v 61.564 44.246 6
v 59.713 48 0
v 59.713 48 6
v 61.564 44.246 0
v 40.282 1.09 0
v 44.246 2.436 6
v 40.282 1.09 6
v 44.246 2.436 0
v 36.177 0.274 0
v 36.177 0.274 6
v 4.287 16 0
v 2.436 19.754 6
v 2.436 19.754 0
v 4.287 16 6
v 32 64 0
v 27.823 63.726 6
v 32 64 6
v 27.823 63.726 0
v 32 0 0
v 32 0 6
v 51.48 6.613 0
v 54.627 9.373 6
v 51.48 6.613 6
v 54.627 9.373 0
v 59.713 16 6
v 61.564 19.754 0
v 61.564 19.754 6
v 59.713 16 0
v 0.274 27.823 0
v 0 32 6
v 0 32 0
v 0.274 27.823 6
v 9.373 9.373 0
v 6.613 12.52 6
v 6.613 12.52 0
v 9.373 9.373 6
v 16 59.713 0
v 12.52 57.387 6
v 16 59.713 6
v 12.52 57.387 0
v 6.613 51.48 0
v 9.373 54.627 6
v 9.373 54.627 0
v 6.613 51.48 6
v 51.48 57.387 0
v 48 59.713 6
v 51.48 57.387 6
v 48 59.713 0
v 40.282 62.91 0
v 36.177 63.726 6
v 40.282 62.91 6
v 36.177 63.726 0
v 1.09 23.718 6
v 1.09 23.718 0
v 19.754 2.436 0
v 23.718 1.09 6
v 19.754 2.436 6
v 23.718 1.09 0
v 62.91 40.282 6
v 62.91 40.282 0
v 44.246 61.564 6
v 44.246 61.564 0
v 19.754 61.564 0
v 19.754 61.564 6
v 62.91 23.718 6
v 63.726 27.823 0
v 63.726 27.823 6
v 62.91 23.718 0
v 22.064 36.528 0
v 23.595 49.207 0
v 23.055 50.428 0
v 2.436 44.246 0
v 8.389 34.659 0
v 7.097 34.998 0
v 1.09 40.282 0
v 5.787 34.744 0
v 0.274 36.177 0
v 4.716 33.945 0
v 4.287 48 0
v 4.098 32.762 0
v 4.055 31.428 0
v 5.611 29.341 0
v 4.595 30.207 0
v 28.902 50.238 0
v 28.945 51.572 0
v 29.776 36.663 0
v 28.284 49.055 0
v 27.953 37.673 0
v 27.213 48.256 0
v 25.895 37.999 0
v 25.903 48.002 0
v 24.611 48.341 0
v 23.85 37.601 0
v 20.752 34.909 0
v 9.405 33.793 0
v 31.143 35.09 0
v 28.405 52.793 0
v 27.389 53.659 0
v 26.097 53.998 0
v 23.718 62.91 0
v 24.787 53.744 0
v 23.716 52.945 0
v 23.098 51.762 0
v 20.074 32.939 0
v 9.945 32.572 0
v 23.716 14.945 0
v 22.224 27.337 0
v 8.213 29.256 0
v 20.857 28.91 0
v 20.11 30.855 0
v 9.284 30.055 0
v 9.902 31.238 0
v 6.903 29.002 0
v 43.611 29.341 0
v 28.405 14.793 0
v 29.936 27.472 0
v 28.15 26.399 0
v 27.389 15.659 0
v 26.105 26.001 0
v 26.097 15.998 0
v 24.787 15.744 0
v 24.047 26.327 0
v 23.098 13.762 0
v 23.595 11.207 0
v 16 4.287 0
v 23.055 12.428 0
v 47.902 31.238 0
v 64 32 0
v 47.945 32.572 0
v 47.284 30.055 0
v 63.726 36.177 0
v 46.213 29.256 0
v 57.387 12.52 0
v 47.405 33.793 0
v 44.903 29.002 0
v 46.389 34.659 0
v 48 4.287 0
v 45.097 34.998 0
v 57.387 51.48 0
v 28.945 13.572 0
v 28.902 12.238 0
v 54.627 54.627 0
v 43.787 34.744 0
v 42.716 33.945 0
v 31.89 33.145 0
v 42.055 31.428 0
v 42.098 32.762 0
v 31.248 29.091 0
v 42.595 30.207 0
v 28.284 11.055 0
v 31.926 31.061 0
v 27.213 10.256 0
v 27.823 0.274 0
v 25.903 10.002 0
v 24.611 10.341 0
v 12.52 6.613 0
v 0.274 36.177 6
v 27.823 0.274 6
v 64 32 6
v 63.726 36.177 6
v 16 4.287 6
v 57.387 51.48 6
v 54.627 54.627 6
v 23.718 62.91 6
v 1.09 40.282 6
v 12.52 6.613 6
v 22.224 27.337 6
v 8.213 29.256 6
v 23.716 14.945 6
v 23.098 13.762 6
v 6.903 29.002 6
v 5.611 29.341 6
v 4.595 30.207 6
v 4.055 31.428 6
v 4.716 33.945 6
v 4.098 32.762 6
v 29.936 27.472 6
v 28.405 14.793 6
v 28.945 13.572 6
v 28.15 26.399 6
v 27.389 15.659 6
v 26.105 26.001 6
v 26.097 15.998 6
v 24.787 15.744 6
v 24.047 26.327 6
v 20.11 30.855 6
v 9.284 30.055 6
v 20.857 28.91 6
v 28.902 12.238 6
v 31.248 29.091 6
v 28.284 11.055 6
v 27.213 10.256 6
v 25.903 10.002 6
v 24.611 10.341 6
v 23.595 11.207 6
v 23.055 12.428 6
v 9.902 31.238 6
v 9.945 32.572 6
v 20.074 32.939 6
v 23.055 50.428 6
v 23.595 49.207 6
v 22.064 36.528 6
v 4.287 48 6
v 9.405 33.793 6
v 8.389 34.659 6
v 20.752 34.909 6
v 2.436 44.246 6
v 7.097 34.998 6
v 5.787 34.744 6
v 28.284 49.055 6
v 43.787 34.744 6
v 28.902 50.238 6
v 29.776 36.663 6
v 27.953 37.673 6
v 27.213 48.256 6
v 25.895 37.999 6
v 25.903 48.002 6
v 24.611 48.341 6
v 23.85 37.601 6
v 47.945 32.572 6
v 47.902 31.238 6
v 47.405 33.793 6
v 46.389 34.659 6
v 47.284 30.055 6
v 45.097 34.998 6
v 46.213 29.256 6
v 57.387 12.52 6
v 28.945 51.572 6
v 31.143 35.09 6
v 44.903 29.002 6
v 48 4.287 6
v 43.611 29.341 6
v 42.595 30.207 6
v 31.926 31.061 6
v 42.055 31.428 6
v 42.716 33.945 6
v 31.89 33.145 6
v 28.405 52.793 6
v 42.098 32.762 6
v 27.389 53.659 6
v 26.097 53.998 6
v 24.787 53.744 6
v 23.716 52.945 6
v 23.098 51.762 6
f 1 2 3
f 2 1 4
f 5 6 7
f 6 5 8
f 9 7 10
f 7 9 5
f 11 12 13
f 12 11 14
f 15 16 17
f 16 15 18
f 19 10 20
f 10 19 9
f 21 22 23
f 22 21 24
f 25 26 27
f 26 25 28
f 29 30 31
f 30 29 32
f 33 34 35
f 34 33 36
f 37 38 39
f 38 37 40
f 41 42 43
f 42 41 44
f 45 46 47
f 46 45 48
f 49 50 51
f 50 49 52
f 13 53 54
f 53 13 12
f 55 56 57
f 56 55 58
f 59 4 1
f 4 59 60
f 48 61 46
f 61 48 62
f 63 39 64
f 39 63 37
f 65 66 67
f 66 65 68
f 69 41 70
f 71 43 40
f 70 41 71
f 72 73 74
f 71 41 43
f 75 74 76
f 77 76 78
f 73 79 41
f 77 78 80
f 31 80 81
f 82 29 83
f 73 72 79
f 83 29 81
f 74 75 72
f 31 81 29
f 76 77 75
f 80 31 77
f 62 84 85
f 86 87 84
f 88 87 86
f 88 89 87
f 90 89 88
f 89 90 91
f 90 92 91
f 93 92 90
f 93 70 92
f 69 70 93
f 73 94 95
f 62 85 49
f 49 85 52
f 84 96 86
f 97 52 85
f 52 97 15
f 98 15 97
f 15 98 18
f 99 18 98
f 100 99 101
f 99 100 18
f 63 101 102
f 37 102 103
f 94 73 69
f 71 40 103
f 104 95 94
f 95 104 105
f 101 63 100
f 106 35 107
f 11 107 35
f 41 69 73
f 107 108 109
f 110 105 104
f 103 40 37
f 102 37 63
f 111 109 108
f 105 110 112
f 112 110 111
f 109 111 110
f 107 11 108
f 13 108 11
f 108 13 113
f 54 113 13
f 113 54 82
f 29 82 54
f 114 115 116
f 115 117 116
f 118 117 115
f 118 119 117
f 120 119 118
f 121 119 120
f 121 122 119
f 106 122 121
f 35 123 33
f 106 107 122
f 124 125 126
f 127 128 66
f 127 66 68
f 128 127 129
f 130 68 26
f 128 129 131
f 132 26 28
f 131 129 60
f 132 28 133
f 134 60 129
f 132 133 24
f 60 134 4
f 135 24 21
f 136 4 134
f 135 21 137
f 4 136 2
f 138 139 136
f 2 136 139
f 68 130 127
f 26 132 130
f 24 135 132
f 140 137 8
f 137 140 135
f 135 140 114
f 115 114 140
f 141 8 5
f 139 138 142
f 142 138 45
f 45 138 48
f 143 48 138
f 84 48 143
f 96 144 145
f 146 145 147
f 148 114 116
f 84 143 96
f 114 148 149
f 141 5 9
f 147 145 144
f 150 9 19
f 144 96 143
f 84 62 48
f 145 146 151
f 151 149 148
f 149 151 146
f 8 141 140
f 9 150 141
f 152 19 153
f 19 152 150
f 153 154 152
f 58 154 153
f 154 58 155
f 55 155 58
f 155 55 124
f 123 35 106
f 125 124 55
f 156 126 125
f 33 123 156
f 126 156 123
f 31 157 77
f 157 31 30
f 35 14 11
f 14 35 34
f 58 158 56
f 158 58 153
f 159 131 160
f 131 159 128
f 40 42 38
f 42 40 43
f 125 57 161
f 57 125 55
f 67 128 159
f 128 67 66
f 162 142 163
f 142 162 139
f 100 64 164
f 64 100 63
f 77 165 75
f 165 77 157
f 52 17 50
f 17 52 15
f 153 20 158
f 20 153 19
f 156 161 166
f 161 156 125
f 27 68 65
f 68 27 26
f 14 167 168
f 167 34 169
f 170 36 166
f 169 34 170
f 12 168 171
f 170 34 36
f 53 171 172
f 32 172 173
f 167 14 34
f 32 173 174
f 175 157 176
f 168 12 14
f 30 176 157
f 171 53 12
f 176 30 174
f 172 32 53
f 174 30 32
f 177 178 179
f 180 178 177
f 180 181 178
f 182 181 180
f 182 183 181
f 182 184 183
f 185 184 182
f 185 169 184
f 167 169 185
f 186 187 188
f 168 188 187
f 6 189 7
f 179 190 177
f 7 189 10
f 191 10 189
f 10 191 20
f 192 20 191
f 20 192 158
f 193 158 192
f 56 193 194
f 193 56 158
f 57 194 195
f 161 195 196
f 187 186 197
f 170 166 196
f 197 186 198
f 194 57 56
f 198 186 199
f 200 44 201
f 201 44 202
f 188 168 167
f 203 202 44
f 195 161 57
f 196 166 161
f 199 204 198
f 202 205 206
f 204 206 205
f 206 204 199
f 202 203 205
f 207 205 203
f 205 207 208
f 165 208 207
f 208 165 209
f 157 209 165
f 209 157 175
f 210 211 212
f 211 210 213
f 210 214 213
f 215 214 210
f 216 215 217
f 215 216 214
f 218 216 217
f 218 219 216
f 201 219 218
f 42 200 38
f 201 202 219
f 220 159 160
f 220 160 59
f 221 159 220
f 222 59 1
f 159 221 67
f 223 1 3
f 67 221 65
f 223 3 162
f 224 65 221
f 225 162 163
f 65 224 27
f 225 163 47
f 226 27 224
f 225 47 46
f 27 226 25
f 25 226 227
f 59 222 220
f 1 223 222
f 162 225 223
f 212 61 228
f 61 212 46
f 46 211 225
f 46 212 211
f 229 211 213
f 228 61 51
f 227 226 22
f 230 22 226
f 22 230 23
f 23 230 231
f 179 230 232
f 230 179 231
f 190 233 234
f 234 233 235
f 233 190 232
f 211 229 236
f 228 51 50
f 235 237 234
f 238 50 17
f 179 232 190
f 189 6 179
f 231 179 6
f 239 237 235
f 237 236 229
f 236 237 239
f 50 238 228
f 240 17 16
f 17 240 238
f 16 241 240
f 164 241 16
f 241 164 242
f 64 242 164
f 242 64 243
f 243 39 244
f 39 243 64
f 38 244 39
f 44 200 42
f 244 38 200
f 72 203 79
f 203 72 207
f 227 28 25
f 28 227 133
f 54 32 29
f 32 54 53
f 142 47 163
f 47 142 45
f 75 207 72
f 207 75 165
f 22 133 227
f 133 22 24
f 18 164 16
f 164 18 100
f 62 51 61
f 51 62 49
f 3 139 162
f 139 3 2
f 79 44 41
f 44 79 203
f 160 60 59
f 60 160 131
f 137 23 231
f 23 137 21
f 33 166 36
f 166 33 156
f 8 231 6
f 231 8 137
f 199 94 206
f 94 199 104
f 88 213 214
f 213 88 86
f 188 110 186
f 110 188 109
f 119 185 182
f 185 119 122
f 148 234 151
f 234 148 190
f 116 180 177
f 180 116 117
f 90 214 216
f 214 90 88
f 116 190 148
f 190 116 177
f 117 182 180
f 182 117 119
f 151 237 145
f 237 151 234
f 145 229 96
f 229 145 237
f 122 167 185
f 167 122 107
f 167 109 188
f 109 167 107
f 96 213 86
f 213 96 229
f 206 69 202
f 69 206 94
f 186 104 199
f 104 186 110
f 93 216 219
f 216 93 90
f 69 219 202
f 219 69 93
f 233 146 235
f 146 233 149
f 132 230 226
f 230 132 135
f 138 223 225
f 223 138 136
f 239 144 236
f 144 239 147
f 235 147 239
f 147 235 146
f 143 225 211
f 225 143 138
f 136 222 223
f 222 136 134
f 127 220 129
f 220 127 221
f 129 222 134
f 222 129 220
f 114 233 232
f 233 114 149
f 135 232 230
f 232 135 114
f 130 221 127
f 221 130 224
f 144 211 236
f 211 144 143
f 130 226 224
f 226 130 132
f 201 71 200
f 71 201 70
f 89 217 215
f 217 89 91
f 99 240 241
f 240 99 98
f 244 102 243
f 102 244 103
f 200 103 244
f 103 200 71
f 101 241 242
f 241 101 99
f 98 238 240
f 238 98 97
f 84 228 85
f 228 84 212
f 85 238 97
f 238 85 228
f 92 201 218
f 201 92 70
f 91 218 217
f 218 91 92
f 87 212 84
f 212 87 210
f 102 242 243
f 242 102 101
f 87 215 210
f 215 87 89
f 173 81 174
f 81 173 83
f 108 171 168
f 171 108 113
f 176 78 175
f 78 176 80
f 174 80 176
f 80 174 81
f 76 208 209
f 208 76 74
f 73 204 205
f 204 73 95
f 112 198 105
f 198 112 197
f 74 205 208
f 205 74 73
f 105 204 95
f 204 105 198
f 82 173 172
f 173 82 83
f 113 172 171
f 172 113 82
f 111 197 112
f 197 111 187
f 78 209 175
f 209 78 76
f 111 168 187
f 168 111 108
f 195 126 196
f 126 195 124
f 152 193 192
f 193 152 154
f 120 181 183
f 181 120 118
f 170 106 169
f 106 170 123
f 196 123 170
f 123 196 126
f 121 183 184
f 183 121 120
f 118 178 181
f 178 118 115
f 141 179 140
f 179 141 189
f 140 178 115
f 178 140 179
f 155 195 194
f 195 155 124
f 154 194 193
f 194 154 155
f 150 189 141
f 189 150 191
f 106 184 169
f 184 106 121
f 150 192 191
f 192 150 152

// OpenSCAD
$fn = 32;

// ----------------------------------------------------------------------
// Cam plate: eccentric cam, base R32
// ----------------------------------------------------------------------

// --- parameters (mm) ---
base_r = 32;              // base circle radius
lobe_h = 12;              // cam lobe rise
bore_r = 6;               // shaft bore radius
plate_t = 6;              // plate thickness, Z (extrusion height)
ecc = 6;                  // disc eccentricity
ring_r = 19;              // lightening ring radius
bolt_r = 3;               // lightening hole radius
fit_tol = 0.1;            // declared fit tolerance (prompt contract)
free_tol = 0.3;           // declared free tolerance (prompt contract)

profile = [[64, 32], [63.726, 36.177], [62.91, 40.282], [61.564, 44.246], [59.713, 48], [57.387, 51.48], [54.627, 54.627], [51.48, 57.387], [48, 59.713], [44.246, 61.564], [40.282, 62.91], [36.177, 63.726], [32, 64], [27.823, 63.726], [23.718, 62.91], [19.754, 61.564], [16, 59.713], [12.52, 57.387], [9.373, 54.627], [6.613, 51.48], [4.287, 48], [2.436, 44.246], [1.09, 40.282], [0.274, 36.177], [0, 32], [0.274, 27.823], [1.09, 23.718], [2.436, 19.754], [4.287, 16], [6.613, 12.52], [9.373, 9.373], [12.52, 6.613], [16, 4.287], [19.754, 2.436], [23.718, 1.09], [27.823, 0.274], [32, 0], [36.177, 0.274], [40.282, 1.09], [44.246, 2.436], [48, 4.287], [51.48, 6.613], [54.627, 9.373], [57.387, 12.52], [59.713, 16], [61.564, 19.754], [62.91, 23.718], [63.726, 27.823]];  // primary outline, 48 points, counter clockwise
void_1 = [[31.89, 33.145], [31.143, 35.09], [29.776, 36.663], [27.953, 37.673], [25.895, 37.999], [23.85, 37.601], [22.064, 36.528], [20.752, 34.909], [20.074, 32.939], [20.11, 30.855], [20.857, 28.91], [22.224, 27.337], [24.047, 26.327], [26.105, 26.001], [28.15, 26.399], [29.936, 27.472], [31.248, 29.091], [31.926, 31.061]];  // shaft bore, 18 points
void_2 = [[47.945, 32.572], [47.405, 33.793], [46.389, 34.659], [45.097, 34.998], [43.787, 34.744], [42.716, 33.945], [42.098, 32.762], [42.055, 31.428], [42.595, 30.207], [43.611, 29.341], [44.903, 29.002], [46.213, 29.256], [47.284, 30.055], [47.902, 31.238]];  // lightening hole 1, 14 points
void_3 = [[28.945, 51.572], [28.405, 52.793], [27.389, 53.659], [26.097, 53.998], [24.787, 53.744], [23.716, 52.945], [23.098, 51.762], [23.055, 50.428], [23.595, 49.207], [24.611, 48.341], [25.903, 48.002], [27.213, 48.256], [28.284, 49.055], [28.902, 50.238]];  // lightening hole 2, 14 points
void_4 = [[9.945, 32.572], [9.405, 33.793], [8.389, 34.659], [7.097, 34.998], [5.787, 34.744], [4.716, 33.945], [4.098, 32.762], [4.055, 31.428], [4.595, 30.207], [5.611, 29.341], [6.903, 29.002], [8.213, 29.256], [9.284, 30.055], [9.902, 31.238]];  // lightening hole 3, 14 points
void_5 = [[28.945, 13.572], [28.405, 14.793], [27.389, 15.659], [26.097, 15.998], [24.787, 15.744], [23.716, 14.945], [23.098, 13.762], [23.055, 12.428], [23.595, 11.207], [24.611, 10.341], [25.903, 10.002], [27.213, 10.256], [28.284, 11.055], [28.902, 12.238]];  // lightening hole 4, 14 points

// --- the one profile operation ---
difference() {
  linear_extrude(height = plate_t) polygon(points = profile);
  translate([0, 0, -1])
    linear_extrude(height = plate_t + 2) polygon(points = void_1);
  translate([0, 0, -1])
    linear_extrude(height = plate_t + 2) polygon(points = void_2);
  translate([0, 0, -1])
    linear_extrude(height = plate_t + 2) polygon(points = void_3);
  translate([0, 0, -1])
    linear_extrude(height = plate_t + 2) polygon(points = void_4);
  translate([0, 0, -1])
    linear_extrude(height = plate_t + 2) polygon(points = void_5);
}
